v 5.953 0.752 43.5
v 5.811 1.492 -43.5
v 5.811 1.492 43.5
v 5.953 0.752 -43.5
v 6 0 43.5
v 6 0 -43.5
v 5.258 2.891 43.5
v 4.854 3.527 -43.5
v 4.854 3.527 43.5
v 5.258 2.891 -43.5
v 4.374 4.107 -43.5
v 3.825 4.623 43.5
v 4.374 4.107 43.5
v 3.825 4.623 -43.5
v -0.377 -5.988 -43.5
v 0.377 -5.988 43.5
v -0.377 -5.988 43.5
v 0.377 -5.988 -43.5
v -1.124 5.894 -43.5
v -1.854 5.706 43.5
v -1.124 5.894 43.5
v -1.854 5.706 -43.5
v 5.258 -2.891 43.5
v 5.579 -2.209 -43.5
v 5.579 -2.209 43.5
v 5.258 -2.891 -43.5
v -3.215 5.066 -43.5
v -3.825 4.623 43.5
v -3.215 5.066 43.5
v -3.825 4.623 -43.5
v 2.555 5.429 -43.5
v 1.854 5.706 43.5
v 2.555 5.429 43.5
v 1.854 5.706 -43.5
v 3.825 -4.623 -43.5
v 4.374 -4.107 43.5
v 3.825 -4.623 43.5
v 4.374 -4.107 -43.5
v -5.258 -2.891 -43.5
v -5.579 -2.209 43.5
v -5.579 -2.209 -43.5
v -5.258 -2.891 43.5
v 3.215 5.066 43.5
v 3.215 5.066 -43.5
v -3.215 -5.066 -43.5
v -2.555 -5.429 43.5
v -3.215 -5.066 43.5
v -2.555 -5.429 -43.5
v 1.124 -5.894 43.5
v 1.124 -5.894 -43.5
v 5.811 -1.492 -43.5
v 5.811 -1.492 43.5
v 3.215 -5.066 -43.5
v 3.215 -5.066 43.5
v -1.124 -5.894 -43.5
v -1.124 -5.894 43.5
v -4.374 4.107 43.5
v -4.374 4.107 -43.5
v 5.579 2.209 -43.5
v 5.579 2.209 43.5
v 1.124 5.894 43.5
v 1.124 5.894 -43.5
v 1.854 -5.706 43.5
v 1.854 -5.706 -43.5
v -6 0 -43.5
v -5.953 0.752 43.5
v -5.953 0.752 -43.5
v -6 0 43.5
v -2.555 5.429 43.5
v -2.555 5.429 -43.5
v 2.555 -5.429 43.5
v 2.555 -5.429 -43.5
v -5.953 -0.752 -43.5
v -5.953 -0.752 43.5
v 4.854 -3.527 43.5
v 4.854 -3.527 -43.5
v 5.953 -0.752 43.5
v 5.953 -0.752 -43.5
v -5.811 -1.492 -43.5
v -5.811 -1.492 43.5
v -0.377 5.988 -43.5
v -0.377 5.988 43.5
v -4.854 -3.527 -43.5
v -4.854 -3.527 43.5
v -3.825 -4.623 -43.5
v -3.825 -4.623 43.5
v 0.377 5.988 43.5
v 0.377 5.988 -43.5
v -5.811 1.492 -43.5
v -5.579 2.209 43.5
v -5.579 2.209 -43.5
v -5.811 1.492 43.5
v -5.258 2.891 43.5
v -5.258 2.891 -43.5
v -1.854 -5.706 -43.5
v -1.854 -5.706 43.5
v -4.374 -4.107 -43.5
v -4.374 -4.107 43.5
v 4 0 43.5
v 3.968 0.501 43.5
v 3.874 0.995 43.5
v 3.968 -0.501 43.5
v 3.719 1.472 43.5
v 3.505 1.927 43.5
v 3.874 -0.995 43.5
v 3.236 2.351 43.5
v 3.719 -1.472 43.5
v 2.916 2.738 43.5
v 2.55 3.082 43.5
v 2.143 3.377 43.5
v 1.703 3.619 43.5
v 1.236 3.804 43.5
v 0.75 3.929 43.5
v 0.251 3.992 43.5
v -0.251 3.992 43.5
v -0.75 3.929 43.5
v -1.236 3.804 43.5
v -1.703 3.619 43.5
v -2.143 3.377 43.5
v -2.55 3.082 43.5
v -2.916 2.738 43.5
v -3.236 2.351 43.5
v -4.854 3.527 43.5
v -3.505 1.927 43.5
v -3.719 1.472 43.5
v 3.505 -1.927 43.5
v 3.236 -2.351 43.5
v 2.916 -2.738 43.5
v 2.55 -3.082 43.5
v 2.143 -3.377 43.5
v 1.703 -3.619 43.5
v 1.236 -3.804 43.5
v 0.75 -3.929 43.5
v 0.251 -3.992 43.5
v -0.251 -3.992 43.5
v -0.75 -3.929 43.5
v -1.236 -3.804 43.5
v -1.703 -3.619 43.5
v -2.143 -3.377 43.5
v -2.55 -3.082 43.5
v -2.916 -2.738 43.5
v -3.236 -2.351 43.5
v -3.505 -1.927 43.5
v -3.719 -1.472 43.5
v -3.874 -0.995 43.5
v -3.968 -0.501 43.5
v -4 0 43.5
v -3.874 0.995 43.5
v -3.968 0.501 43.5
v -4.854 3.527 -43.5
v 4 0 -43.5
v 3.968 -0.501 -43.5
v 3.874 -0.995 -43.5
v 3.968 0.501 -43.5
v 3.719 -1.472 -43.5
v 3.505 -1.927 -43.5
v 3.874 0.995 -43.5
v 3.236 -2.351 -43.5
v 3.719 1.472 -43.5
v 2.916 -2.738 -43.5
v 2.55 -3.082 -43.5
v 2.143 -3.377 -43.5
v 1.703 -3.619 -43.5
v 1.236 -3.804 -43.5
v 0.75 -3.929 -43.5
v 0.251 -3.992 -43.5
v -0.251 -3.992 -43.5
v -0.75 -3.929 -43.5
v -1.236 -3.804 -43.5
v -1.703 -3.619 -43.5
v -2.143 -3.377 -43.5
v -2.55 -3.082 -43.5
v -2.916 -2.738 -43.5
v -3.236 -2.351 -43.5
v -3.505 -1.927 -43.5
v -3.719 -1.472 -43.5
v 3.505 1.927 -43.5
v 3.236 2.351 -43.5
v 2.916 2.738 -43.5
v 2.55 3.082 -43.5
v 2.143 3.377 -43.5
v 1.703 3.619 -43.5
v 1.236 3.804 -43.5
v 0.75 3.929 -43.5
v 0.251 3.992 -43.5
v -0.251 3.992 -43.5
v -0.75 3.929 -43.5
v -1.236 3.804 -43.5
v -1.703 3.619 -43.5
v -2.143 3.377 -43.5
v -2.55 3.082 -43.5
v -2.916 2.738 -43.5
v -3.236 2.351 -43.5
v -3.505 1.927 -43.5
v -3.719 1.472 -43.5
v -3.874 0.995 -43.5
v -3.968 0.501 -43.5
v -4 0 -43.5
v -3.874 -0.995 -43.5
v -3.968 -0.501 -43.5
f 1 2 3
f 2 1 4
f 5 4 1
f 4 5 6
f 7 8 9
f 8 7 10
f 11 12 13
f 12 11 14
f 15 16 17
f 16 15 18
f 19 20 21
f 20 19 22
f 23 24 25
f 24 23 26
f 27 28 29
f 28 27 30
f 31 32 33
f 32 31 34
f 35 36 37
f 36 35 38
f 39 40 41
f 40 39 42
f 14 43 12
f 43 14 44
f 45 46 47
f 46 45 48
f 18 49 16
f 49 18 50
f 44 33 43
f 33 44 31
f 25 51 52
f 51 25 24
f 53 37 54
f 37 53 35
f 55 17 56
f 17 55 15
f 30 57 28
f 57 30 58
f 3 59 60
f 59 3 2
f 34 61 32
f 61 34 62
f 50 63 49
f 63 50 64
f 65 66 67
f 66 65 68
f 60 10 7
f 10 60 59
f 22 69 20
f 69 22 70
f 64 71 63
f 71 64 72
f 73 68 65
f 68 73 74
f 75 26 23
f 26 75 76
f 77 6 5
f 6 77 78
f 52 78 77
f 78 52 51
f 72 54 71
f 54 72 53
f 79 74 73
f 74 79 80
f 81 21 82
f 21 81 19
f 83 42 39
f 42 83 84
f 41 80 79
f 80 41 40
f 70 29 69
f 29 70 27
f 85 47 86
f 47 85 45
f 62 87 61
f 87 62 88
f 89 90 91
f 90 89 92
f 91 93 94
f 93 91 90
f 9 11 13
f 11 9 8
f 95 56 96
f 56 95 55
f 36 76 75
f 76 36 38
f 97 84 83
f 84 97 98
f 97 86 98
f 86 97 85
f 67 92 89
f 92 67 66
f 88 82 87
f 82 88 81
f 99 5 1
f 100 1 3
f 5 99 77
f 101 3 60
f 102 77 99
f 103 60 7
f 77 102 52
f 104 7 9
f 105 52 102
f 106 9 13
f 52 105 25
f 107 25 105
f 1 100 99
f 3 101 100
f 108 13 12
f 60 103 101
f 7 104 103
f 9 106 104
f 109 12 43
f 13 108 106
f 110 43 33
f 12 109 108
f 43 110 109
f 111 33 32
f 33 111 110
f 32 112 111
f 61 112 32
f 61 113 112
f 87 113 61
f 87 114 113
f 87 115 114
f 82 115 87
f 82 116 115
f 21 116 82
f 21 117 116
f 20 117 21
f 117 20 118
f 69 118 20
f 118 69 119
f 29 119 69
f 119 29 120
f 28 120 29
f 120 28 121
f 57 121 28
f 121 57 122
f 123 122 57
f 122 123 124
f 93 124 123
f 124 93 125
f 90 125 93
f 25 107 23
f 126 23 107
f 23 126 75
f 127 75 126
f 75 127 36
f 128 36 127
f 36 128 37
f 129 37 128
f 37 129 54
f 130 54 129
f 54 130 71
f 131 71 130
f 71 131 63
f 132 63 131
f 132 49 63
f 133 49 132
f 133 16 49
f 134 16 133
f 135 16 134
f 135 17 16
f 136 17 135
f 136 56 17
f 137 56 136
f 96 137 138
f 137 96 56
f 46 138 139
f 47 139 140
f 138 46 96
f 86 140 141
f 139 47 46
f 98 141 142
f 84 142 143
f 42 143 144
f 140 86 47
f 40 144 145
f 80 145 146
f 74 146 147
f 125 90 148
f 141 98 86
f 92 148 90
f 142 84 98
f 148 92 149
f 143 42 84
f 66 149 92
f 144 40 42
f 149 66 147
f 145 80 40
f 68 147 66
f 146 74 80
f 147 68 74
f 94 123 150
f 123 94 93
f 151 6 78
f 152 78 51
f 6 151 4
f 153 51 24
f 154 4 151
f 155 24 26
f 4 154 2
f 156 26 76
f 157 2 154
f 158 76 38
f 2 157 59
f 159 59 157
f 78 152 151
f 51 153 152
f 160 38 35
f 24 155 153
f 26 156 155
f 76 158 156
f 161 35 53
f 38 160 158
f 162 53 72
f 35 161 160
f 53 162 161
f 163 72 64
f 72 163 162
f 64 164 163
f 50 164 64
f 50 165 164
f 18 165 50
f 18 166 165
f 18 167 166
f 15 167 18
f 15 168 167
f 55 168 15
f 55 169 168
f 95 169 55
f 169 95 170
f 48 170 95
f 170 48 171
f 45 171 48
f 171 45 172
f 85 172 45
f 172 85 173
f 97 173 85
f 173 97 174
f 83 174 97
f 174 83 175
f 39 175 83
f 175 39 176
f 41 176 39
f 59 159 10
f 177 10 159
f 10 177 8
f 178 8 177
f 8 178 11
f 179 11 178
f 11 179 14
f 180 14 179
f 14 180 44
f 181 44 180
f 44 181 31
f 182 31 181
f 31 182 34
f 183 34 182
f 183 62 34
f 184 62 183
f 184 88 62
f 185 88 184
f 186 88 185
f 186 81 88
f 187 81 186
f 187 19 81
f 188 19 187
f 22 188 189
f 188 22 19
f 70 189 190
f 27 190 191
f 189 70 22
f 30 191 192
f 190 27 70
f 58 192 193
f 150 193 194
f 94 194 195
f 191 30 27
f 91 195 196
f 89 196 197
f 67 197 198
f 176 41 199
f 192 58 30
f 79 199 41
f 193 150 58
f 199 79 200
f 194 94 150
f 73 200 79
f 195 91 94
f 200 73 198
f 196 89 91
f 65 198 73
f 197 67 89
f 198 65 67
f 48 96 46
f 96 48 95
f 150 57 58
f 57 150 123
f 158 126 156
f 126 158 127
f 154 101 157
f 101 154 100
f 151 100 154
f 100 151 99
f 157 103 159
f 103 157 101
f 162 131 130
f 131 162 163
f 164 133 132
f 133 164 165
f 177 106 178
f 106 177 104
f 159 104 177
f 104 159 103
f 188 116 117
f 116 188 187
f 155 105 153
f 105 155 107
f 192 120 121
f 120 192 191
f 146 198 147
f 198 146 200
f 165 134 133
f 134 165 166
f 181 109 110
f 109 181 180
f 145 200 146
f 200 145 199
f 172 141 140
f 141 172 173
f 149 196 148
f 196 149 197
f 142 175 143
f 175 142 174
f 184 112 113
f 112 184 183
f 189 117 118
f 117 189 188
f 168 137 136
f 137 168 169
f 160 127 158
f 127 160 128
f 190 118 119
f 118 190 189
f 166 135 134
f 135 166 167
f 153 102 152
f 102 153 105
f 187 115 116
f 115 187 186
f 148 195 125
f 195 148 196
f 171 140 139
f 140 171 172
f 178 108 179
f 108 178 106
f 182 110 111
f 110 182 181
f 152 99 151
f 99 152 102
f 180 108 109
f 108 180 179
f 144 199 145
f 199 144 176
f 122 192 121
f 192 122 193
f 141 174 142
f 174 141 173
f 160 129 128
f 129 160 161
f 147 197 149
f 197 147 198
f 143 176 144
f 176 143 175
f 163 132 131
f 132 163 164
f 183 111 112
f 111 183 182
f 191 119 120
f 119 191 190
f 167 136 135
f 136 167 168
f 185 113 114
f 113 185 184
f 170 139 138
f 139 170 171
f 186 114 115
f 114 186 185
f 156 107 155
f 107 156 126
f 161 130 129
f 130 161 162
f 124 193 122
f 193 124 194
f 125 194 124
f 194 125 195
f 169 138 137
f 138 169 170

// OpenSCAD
$fn = 50;


difference() {
	union() {
		translate(v = [0, 0, -43.5000000000]) {
			cylinder(h = 87, r = 6.0000000000);
		}
	}
	union() {
		translate(v = [0, 0, -100.0000000000]) {
			cylinder(h = 200, r = 4.0000000000);
		}
	}
}
